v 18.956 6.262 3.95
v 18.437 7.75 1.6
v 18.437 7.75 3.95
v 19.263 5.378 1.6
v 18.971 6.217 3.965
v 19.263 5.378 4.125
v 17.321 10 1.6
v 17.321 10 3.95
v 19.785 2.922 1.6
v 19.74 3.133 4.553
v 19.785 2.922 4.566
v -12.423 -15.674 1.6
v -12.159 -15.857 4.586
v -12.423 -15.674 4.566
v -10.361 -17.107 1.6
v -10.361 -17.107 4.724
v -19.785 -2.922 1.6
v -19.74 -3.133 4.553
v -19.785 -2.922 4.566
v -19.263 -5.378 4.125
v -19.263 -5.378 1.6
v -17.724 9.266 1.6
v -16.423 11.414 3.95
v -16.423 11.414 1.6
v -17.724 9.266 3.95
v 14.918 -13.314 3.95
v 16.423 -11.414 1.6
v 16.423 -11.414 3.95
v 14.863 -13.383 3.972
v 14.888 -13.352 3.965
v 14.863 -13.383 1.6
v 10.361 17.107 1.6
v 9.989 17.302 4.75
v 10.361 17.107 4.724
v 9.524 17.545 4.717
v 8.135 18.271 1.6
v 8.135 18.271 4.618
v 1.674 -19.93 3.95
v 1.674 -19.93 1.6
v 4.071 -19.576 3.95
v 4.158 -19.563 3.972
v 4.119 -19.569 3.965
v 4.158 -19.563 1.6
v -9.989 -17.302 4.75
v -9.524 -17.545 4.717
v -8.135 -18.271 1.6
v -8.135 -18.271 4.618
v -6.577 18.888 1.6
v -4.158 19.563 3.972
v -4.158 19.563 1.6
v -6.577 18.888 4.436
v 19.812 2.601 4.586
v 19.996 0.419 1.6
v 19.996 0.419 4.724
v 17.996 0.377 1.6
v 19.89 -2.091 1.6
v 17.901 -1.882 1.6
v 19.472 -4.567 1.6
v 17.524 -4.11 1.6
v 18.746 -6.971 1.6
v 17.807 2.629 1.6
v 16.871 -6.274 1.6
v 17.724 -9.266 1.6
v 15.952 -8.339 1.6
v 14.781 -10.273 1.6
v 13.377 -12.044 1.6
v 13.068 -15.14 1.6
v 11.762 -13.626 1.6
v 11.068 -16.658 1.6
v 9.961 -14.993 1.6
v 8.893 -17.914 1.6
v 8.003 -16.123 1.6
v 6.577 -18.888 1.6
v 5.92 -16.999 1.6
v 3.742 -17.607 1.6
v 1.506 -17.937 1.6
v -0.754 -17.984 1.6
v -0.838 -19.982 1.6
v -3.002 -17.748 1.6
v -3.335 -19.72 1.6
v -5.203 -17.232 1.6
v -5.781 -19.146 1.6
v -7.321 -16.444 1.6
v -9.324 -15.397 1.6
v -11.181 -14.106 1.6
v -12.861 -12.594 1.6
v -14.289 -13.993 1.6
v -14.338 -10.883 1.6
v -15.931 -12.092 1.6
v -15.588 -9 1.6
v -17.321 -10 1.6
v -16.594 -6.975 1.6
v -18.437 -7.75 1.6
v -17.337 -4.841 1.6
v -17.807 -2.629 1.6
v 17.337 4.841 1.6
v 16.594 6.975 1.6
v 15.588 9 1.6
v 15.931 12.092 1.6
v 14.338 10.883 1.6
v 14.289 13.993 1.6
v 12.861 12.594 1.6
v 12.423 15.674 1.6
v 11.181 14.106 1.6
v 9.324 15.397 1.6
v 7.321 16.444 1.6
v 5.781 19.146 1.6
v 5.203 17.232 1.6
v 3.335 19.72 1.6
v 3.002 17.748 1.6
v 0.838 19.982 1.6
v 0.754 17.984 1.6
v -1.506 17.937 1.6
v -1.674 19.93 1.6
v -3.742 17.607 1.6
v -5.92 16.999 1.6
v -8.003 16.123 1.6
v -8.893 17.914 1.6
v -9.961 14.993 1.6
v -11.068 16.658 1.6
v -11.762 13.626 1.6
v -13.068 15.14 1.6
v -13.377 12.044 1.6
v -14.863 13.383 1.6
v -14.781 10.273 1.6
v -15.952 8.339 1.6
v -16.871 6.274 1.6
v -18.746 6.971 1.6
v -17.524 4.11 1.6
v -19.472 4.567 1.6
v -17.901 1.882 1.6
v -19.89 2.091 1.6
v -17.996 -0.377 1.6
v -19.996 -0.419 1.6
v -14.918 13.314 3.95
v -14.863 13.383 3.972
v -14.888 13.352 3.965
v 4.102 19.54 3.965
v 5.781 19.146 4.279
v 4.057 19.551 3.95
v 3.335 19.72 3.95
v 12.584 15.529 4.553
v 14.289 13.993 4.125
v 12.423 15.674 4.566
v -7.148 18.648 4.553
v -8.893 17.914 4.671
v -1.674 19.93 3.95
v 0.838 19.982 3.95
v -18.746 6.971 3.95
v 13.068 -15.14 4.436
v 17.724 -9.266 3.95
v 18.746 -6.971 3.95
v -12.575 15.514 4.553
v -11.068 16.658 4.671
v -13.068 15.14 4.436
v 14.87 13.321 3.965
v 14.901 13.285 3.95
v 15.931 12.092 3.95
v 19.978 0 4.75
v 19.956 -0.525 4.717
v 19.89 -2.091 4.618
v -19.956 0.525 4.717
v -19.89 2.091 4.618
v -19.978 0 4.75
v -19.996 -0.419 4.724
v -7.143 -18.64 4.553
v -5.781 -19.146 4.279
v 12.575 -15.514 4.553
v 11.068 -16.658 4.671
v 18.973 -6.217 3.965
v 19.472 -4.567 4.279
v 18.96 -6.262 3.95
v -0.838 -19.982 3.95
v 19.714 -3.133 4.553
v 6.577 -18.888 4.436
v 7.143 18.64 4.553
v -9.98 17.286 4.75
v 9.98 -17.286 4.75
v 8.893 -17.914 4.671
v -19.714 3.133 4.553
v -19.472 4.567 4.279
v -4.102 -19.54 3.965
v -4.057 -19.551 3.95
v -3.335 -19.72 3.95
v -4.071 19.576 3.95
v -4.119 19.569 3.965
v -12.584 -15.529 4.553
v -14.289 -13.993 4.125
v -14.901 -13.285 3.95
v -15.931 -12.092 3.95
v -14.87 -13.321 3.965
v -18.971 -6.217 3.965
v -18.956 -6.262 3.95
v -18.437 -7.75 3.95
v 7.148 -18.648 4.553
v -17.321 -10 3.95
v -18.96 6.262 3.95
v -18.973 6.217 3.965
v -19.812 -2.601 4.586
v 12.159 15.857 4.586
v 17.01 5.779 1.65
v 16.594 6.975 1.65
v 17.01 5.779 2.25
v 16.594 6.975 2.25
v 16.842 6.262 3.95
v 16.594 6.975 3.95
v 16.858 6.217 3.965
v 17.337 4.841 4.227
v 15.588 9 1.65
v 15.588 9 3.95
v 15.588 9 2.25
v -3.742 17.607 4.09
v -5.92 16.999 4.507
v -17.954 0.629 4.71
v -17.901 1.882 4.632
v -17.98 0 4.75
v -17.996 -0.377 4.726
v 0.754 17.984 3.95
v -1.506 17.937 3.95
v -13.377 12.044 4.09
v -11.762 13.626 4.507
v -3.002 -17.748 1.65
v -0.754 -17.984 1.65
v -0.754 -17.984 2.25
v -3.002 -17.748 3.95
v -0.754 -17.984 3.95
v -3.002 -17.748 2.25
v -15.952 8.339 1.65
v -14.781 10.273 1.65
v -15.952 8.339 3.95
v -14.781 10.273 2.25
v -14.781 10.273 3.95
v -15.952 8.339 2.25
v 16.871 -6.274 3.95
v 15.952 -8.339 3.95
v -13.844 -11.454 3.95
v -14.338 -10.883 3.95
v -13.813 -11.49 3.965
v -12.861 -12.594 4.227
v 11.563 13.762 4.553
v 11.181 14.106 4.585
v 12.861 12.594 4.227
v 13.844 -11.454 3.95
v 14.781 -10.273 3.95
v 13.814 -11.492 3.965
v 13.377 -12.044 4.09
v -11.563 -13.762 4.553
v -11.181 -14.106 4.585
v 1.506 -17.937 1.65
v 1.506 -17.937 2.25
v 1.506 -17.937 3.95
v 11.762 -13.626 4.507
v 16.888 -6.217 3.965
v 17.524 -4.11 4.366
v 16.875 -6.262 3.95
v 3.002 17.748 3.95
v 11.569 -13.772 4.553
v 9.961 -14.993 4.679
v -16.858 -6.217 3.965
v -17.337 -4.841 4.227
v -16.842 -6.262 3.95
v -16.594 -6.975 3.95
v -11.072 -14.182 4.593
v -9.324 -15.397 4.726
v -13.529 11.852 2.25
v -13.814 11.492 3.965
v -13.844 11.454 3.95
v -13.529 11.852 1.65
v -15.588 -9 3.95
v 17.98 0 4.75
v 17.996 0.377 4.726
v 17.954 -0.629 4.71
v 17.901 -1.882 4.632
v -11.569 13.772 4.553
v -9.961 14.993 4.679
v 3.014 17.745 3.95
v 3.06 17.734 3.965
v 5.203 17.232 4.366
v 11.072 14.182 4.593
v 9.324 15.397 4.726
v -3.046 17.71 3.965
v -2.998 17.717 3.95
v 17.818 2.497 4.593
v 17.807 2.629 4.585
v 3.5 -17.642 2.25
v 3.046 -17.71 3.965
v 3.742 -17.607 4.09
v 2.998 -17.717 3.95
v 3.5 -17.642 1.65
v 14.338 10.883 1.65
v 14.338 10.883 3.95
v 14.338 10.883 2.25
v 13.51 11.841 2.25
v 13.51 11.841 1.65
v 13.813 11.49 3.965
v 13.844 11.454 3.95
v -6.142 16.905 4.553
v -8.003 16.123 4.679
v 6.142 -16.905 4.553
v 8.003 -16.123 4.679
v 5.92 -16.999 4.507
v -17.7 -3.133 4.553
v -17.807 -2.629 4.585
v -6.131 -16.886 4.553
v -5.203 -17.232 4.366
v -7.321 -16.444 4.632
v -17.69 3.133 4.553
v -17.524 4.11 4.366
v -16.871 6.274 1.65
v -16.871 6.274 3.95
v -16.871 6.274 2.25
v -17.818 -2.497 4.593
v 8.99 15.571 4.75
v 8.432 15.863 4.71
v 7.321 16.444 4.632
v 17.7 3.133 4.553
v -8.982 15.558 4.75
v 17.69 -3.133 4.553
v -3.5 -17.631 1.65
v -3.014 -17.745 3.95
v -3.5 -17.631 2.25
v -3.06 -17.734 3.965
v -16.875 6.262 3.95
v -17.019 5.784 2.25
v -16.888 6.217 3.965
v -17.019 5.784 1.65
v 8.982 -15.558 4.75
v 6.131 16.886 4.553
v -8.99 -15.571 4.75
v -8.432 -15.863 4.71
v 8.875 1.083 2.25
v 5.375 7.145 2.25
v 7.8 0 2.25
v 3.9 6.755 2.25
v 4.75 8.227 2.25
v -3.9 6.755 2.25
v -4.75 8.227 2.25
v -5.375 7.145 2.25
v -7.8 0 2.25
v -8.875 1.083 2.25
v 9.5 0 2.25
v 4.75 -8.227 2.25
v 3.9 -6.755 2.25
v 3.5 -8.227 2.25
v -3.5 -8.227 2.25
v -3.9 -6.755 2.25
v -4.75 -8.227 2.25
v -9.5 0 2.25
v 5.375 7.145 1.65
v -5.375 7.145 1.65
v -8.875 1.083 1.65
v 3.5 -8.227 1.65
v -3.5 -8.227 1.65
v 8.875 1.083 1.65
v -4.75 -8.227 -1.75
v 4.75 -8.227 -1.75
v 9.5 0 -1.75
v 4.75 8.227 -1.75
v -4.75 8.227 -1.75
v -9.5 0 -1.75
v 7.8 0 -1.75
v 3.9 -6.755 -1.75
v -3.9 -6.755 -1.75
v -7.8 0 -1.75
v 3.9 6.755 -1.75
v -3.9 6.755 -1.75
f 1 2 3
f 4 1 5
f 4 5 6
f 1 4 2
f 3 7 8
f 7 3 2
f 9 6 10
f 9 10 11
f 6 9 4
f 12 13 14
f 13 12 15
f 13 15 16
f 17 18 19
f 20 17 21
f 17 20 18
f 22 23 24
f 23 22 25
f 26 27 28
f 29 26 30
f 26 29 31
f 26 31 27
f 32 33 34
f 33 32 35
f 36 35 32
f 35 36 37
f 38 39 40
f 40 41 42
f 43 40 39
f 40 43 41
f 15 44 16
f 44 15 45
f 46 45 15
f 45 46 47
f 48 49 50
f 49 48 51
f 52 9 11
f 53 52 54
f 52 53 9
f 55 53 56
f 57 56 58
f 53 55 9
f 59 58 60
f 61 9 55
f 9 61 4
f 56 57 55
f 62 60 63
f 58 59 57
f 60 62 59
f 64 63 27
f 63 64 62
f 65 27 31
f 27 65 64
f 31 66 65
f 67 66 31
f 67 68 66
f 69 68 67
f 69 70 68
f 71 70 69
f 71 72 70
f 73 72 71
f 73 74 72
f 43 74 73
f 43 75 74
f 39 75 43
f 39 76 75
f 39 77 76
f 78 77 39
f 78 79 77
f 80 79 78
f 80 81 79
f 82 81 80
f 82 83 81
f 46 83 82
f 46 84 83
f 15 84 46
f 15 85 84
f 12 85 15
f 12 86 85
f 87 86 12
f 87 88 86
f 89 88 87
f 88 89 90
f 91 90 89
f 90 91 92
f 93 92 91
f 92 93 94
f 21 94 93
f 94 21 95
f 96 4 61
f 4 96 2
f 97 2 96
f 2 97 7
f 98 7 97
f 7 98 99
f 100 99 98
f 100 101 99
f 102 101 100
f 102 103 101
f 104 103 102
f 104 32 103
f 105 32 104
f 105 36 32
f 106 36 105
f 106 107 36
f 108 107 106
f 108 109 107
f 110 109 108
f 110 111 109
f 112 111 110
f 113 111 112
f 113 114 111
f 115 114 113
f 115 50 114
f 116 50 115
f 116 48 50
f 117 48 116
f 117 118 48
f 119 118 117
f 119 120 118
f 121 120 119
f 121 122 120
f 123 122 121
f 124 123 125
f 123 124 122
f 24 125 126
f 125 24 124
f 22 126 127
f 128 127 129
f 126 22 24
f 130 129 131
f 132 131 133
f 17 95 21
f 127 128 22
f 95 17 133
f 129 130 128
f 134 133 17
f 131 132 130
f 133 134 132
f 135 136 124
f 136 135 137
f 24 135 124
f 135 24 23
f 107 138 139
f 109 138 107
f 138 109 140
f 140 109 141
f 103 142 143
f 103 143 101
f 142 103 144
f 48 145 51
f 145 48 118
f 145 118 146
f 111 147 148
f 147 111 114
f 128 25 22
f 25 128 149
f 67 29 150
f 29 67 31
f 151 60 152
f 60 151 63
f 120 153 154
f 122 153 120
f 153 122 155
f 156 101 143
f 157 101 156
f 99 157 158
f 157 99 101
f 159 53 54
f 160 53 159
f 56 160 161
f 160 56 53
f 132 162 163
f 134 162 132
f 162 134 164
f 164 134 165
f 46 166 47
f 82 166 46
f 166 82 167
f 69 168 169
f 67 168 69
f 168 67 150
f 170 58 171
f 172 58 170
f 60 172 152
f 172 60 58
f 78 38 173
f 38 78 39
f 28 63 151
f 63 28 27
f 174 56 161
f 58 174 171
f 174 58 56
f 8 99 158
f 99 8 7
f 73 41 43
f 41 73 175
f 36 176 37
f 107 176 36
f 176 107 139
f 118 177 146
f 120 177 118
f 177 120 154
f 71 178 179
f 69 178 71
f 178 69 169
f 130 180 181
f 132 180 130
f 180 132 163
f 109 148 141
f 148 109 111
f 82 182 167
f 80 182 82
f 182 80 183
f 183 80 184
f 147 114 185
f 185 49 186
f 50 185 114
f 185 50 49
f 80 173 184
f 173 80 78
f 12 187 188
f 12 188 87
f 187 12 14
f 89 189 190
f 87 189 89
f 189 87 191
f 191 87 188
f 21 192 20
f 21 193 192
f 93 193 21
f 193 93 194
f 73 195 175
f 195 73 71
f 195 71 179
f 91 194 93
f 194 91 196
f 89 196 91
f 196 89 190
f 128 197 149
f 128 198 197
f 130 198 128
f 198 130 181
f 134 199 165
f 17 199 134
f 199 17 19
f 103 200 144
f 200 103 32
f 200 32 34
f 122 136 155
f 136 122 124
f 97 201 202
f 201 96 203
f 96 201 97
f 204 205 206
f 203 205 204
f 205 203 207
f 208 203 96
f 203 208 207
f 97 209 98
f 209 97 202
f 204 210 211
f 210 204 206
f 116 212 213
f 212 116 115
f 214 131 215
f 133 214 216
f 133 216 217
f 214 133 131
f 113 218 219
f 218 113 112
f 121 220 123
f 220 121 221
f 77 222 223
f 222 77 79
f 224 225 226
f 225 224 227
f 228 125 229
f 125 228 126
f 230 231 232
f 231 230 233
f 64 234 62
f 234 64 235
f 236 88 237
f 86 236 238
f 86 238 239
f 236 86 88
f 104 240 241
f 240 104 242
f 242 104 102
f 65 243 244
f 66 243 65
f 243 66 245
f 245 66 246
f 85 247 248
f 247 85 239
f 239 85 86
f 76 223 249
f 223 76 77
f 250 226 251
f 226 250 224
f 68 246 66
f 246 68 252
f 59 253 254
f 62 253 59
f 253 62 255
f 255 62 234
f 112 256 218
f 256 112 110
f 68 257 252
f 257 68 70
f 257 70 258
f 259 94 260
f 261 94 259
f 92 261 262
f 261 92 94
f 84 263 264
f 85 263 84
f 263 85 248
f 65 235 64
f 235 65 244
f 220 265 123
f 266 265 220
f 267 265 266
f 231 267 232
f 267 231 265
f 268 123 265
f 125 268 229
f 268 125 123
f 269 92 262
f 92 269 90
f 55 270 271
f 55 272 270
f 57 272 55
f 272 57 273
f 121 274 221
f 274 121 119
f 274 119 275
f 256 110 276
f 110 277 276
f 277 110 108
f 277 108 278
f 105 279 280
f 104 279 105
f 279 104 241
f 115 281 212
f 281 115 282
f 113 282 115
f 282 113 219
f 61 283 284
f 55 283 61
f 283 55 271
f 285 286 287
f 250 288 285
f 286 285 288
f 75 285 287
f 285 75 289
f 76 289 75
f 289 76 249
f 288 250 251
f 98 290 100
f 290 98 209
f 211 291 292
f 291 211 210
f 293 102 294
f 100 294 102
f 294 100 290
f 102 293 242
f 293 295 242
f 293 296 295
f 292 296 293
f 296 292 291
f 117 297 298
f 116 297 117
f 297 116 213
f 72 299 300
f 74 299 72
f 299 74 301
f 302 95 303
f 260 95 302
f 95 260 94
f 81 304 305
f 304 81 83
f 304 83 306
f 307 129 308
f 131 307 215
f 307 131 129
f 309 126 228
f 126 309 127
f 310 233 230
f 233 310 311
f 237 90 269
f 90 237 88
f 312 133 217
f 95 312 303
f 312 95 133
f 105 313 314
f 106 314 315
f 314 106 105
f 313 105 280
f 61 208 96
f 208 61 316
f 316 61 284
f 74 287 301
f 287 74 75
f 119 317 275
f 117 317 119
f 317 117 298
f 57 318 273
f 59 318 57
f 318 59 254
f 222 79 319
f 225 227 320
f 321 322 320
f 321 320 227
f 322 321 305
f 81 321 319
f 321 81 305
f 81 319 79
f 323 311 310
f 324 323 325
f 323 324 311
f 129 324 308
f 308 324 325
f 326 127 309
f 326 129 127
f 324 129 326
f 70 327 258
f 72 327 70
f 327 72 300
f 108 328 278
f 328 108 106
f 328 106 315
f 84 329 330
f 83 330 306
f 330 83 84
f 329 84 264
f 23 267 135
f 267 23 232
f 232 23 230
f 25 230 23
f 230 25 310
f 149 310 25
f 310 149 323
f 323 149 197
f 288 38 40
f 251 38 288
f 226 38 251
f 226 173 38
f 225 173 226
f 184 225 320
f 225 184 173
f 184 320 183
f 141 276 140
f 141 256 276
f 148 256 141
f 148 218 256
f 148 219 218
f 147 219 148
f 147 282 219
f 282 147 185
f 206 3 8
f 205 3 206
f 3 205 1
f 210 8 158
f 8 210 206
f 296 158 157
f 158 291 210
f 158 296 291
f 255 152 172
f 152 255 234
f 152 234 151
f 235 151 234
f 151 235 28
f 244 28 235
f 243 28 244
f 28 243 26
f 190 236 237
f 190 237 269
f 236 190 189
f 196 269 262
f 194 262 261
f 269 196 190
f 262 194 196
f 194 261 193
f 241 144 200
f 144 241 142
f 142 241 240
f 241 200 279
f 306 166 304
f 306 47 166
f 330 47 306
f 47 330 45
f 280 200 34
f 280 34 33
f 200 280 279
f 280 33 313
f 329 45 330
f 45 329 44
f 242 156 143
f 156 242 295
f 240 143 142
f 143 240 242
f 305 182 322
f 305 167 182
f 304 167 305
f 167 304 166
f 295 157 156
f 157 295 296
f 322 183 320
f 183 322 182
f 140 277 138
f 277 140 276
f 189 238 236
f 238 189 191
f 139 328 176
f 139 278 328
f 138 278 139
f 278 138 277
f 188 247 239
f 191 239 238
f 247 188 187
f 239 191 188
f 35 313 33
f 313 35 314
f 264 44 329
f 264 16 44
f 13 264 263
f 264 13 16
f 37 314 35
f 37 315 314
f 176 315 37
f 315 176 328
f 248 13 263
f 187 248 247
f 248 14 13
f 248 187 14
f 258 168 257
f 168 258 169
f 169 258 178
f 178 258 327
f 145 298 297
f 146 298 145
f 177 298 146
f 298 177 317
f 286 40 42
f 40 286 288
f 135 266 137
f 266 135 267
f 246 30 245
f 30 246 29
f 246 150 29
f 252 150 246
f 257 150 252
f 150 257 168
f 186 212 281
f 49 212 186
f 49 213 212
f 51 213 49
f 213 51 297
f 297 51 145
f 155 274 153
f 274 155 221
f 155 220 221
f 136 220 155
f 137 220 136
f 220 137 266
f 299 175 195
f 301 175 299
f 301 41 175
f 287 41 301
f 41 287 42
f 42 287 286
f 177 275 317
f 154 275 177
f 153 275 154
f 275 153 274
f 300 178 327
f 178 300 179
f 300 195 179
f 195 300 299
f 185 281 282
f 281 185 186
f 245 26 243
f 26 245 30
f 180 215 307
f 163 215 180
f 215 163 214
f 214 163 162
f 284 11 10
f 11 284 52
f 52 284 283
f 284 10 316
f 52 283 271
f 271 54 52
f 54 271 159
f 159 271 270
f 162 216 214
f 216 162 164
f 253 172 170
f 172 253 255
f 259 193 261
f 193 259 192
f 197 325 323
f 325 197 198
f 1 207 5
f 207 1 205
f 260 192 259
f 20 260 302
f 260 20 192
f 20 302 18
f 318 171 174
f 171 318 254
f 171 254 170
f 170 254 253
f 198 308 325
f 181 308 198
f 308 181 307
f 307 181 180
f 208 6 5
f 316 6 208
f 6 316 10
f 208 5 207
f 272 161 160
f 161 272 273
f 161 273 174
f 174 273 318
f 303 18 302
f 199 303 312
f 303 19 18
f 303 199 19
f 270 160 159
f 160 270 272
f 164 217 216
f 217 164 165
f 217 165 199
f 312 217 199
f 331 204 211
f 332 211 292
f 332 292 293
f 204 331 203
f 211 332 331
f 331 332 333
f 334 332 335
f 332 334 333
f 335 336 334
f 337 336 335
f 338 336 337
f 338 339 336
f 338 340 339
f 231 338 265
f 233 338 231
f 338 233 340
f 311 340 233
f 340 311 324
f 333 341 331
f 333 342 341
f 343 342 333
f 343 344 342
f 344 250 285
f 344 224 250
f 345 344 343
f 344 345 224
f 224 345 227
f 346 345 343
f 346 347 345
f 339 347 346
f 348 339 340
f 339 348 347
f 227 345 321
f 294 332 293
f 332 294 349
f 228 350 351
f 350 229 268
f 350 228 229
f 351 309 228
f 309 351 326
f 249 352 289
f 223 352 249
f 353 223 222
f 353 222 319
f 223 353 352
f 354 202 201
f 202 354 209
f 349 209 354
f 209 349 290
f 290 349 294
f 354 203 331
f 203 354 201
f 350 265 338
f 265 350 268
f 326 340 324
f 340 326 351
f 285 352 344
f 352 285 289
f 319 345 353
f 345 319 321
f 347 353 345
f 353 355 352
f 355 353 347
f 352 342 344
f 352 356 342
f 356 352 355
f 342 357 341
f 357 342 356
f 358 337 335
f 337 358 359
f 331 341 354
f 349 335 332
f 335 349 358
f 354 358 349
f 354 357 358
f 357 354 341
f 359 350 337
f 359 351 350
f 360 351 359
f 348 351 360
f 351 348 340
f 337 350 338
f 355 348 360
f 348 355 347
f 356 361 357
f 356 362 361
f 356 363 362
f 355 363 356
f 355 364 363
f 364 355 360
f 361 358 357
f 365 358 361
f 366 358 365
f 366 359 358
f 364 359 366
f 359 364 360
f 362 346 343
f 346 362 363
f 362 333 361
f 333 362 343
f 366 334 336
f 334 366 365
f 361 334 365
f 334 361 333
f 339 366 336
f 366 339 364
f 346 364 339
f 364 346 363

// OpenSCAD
// file: ClickRingBase.scad
$fn=50;
overlap=0.006;

clickringHeight=4.5;
clickringDiameter=40;
clickringThickness=2;

notchDiameter=50;
notchHeight=0.7;

deltaRinsize=2;

module ring(height=clickringHeight,delta=0){
    difference()
    {
        cylinder(h=height+delta-deltaRinsize,d=clickringDiameter+delta,center=true);
        cylinder(h=height+1-delta-deltaRinsize,d=clickringDiameter-clickringThickness*2-delta,center=true);
    }
}
// file: Dimensions.scad
overlap=0.006;
$fn=50;

basePlateThickness=1;

ringOuterDiameter=60;
ringInnerDiameter=47;
ringHeight=10;
baseRingHeight=7;
capRingHeight=baseRingHeight;

axeDiameter=10;

screwHoleInnerDiameter=2.5;
screwHoleOuterDiameter=3.0;
screwHoleLength=14;
screwHoleStrengthener=0.5;

shaftLength=ringHeight*6+baseRingHeight+capRingHeight-screwHoleStrengthener-basePlateThickness*2;
shaftDiameter=9.5;
// main file
include <Dimensions.scad>
include <ClickRingBase.scad>

clickRing2();

module clickRing2(){
    translate([0,0,deltaRinsize/2+1.50])
    createRing2();

    cubeS=15;
    cubeH=4.0;
    difference()
    {
        union(){
            translate([0,0,-cubeH/2+clickringHeight/2])
            cylinder(h=cubeH,d=cubeS+4,center=true,$fn=6);

            for(i=[30:120:389]){
                rotate([0,0,i])
                translate([clickringDiameter/4-clickringThickness/2,0,4/2-0.05])
                cube([clickringDiameter/2,7.0,0.6],center=true);
            }
        }

        union(){
            cylinder(h=clickringHeight+overlap,d=axeDiameter,center=true);

            translate([0,0,-cubeH/2+clickringHeight/2])
            cylinder(h=cubeH+overlap,d=cubeS+0.6,center=true,$fn=6);
        }
    }
}

module createRing2(){
    rotate([180,0,30])
    difference()
    {
        translate([0,0,-notchHeight])
        ring(clickringHeight+notchHeight,0);

        translate([0,0,-clickringHeight])
        ringWithNotch(0.2);
    }
}

module ringWithNotch(delta=0){
    translate([0,0,deltaRinsize/2+notchHeight])
    difference()
    {
        ring(clickringHeight,delta);

        translate([0,0,notchDiameter/2+clickringHeight/2-deltaRinsize/2-notchHeight])
        for(a=[0:60:179]){
            rotate([a+30,90,0])
            cylinder(h=60,d=notchDiameter,center=true);
        }
    }
}
